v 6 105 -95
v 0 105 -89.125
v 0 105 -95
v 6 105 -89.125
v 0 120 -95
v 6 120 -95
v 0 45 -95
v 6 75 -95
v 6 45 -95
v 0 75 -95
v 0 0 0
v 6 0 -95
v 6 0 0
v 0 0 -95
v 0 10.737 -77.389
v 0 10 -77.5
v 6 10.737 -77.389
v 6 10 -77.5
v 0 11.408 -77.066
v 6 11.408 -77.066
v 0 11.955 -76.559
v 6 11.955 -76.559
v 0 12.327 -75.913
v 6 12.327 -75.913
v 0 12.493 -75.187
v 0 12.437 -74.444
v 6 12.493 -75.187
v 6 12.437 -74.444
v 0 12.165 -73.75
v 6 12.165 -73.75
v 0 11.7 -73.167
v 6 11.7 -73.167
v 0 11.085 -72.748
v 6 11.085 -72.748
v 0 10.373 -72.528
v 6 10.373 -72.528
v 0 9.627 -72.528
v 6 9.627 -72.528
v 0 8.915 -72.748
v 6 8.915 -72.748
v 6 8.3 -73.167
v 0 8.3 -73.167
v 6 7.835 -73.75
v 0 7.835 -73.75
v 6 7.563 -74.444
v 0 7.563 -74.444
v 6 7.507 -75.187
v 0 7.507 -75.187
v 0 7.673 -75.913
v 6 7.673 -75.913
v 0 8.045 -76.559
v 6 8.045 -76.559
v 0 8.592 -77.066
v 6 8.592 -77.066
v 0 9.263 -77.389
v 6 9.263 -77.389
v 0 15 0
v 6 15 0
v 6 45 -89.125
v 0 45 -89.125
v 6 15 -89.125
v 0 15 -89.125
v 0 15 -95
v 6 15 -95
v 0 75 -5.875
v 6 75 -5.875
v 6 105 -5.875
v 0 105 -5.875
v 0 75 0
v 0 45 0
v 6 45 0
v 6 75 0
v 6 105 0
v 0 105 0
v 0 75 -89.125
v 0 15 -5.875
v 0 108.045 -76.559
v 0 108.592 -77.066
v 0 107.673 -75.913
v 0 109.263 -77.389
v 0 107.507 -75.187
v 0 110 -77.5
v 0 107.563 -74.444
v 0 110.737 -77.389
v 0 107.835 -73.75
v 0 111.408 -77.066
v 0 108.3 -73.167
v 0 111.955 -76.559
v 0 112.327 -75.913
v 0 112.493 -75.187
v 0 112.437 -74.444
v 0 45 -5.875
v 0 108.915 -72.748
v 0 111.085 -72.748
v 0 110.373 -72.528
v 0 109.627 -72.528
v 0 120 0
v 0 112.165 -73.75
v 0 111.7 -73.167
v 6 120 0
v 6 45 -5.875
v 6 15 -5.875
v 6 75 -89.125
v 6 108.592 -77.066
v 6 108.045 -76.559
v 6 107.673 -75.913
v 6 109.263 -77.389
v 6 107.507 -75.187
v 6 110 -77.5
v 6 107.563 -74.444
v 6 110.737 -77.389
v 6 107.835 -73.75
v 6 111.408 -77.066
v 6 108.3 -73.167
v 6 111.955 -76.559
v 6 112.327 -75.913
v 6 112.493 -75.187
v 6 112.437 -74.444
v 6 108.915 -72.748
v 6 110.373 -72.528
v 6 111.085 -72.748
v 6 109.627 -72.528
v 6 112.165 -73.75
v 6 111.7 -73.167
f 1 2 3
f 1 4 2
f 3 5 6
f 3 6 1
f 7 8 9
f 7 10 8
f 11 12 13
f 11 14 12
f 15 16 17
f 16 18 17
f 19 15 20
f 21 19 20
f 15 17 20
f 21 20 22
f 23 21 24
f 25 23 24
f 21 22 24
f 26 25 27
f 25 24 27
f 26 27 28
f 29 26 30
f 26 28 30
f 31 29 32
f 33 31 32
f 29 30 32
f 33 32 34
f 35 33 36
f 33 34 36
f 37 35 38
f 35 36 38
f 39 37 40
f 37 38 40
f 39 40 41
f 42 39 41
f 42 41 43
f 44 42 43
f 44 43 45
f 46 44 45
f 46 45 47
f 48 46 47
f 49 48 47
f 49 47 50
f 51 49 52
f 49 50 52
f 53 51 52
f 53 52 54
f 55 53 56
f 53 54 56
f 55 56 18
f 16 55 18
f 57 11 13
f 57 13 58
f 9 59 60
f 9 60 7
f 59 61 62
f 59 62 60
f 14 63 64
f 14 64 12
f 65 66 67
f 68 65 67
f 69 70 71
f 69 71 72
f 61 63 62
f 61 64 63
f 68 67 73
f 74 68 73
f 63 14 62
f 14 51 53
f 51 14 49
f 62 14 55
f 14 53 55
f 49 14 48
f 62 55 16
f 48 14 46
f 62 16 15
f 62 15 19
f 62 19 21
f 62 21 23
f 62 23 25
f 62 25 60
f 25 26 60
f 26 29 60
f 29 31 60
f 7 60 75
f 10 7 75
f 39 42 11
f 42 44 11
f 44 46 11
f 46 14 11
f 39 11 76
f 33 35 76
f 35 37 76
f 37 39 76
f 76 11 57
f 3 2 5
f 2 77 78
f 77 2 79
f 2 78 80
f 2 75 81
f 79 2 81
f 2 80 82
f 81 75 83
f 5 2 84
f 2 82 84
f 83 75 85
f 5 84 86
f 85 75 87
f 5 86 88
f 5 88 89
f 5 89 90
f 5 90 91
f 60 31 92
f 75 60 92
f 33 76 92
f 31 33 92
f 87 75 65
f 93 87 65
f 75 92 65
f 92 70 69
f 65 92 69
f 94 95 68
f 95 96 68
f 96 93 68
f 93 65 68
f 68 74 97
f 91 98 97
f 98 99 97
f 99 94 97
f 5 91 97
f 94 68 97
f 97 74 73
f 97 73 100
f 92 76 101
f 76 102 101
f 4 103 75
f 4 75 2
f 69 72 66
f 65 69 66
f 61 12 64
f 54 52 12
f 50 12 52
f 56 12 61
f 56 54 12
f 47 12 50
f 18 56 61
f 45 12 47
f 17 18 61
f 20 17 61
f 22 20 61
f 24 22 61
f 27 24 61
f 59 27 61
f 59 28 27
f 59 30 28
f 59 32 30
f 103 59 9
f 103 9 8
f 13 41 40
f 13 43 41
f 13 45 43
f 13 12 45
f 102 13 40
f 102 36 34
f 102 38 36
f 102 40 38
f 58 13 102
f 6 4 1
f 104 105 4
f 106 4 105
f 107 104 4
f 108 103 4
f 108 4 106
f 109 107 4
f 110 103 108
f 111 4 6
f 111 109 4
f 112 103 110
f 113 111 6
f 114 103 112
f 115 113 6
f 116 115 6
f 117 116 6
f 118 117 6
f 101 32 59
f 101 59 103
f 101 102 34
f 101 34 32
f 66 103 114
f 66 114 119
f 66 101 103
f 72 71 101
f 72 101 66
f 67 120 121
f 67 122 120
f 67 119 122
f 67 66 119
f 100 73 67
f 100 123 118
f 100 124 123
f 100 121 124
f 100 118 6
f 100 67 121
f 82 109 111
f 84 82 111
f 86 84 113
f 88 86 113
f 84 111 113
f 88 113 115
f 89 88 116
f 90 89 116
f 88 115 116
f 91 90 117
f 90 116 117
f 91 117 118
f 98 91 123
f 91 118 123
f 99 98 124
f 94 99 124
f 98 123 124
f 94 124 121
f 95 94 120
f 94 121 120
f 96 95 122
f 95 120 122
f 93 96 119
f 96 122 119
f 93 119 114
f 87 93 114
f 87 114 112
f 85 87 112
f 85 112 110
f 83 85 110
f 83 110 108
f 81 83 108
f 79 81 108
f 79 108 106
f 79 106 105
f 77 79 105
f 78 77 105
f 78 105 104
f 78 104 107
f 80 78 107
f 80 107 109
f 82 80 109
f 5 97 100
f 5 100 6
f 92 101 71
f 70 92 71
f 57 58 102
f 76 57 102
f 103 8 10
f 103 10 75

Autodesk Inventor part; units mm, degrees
ref_plane "YZ Plane" through (0, 0, 0) normal (1, 0, 0) x (0, 1, 0)
ref_plane "XZ Plane" through (0, 0, 0) normal (0, 1, 0) x (-1, 0, 0)
ref_plane "XY Plane" through (0, 0, 0) normal (0, 0, 1) x (1, 0, 0)
sketch "Sketch1" plane through (0, 0, 0) normal (1, 0, 0) x (0, 1, 0)
  line L0 (0, 0) -> (120, 0)
  line L1 (120, 0) -> (120, -95)
  line L2 (120, -95) -> (0, -95)
  line L3 (0, -95) -> (0, 0)
  dimension "d0" = 120
  dimension "d1" = 95
extrude "Extrusion1" add sketch "Sketch1" along normal blind 6
sketch "Sketch2" plane through (6, 0, 0) normal (1, 0, 0) x (0, 0, -1)
  line L0 (0, 120) -> (0, 0) projected
  line L1 (0, 0) -> (95, 0) projected
  line L2 (95, 0) -> (95, 120) projected
  line L3 (95, 120) -> (0, 120) projected
  line L4 (0, 120) -> (0, 0) projected
  line L5 (0, 15) -> (5.875, 15)
  line L6 (5.875, 15) -> (5.875, 45)
  line L7 (5.875, 45) -> (0, 45)
  line L8 (0, 45) -> (0, 15)
  line L9 (0, 75) -> (5.875, 75)
  line L10 (5.875, 75) -> (5.875, 105)
  line L11 (5.875, 105) -> (0, 105)
  line L12 (0, 105) -> (0, 75)
  line L13 (95, 15) -> (89.125, 15)
  line L14 (89.125, 15) -> (89.125, 45)
  line L15 (89.125, 45) -> (95, 45)
  line L16 (95, 45) -> (95, 15)
  line L17 (95, 75) -> (89.125, 75)
  line L18 (89.125, 75) -> (89.125, 105)
  line L19 (89.125, 105) -> (95, 105)
  line L20 (95, 105) -> (95, 75)
  line L21 (-12.0657, 60) -> (104.2665, 60)
  line L22 (95, 120) -> (0, 120) projected
  dimension "d5" = 5.875
  dimension "d6" = 5.875
  dimension "d8" = 30
  dimension "d9" = 30
  dimension "d22" = 60
  dimension "d23" = 15
  dimension "d24" = 15
extrude "Extrusion2" cut sketch "Sketch2" against normal up to next contours L11 L10 L9 L0 | L2 L17 L18 L19 | L7 L6 L5 L0 | L2 L13 L14 L15
sketch "Sketch3" plane through (6, 0, 0) normal (1, 0, 0) x (0, 0, -1)
  circle A0 centre (75, 10) radius 2.5
  circle A1 centre (75, 110) radius 2.5
  line L0 (95, 105) -> (95, 120) projected
  line L1 (95, 120) -> (0, 120) projected
  line L2 (95, 0) -> (95, 15) projected
  line L3 (0, 0) -> (95, 0) projected
  dimension "d13" = 20
  dimension "d14" = 10
  dimension "d15" = 5
  dimension "d17" = 10
  dimension "d18" = 20
  dimension "d19" = 5
extrude "Extrusion3" cut sketch "Sketch3" against normal up to next
properties part number "Side"
